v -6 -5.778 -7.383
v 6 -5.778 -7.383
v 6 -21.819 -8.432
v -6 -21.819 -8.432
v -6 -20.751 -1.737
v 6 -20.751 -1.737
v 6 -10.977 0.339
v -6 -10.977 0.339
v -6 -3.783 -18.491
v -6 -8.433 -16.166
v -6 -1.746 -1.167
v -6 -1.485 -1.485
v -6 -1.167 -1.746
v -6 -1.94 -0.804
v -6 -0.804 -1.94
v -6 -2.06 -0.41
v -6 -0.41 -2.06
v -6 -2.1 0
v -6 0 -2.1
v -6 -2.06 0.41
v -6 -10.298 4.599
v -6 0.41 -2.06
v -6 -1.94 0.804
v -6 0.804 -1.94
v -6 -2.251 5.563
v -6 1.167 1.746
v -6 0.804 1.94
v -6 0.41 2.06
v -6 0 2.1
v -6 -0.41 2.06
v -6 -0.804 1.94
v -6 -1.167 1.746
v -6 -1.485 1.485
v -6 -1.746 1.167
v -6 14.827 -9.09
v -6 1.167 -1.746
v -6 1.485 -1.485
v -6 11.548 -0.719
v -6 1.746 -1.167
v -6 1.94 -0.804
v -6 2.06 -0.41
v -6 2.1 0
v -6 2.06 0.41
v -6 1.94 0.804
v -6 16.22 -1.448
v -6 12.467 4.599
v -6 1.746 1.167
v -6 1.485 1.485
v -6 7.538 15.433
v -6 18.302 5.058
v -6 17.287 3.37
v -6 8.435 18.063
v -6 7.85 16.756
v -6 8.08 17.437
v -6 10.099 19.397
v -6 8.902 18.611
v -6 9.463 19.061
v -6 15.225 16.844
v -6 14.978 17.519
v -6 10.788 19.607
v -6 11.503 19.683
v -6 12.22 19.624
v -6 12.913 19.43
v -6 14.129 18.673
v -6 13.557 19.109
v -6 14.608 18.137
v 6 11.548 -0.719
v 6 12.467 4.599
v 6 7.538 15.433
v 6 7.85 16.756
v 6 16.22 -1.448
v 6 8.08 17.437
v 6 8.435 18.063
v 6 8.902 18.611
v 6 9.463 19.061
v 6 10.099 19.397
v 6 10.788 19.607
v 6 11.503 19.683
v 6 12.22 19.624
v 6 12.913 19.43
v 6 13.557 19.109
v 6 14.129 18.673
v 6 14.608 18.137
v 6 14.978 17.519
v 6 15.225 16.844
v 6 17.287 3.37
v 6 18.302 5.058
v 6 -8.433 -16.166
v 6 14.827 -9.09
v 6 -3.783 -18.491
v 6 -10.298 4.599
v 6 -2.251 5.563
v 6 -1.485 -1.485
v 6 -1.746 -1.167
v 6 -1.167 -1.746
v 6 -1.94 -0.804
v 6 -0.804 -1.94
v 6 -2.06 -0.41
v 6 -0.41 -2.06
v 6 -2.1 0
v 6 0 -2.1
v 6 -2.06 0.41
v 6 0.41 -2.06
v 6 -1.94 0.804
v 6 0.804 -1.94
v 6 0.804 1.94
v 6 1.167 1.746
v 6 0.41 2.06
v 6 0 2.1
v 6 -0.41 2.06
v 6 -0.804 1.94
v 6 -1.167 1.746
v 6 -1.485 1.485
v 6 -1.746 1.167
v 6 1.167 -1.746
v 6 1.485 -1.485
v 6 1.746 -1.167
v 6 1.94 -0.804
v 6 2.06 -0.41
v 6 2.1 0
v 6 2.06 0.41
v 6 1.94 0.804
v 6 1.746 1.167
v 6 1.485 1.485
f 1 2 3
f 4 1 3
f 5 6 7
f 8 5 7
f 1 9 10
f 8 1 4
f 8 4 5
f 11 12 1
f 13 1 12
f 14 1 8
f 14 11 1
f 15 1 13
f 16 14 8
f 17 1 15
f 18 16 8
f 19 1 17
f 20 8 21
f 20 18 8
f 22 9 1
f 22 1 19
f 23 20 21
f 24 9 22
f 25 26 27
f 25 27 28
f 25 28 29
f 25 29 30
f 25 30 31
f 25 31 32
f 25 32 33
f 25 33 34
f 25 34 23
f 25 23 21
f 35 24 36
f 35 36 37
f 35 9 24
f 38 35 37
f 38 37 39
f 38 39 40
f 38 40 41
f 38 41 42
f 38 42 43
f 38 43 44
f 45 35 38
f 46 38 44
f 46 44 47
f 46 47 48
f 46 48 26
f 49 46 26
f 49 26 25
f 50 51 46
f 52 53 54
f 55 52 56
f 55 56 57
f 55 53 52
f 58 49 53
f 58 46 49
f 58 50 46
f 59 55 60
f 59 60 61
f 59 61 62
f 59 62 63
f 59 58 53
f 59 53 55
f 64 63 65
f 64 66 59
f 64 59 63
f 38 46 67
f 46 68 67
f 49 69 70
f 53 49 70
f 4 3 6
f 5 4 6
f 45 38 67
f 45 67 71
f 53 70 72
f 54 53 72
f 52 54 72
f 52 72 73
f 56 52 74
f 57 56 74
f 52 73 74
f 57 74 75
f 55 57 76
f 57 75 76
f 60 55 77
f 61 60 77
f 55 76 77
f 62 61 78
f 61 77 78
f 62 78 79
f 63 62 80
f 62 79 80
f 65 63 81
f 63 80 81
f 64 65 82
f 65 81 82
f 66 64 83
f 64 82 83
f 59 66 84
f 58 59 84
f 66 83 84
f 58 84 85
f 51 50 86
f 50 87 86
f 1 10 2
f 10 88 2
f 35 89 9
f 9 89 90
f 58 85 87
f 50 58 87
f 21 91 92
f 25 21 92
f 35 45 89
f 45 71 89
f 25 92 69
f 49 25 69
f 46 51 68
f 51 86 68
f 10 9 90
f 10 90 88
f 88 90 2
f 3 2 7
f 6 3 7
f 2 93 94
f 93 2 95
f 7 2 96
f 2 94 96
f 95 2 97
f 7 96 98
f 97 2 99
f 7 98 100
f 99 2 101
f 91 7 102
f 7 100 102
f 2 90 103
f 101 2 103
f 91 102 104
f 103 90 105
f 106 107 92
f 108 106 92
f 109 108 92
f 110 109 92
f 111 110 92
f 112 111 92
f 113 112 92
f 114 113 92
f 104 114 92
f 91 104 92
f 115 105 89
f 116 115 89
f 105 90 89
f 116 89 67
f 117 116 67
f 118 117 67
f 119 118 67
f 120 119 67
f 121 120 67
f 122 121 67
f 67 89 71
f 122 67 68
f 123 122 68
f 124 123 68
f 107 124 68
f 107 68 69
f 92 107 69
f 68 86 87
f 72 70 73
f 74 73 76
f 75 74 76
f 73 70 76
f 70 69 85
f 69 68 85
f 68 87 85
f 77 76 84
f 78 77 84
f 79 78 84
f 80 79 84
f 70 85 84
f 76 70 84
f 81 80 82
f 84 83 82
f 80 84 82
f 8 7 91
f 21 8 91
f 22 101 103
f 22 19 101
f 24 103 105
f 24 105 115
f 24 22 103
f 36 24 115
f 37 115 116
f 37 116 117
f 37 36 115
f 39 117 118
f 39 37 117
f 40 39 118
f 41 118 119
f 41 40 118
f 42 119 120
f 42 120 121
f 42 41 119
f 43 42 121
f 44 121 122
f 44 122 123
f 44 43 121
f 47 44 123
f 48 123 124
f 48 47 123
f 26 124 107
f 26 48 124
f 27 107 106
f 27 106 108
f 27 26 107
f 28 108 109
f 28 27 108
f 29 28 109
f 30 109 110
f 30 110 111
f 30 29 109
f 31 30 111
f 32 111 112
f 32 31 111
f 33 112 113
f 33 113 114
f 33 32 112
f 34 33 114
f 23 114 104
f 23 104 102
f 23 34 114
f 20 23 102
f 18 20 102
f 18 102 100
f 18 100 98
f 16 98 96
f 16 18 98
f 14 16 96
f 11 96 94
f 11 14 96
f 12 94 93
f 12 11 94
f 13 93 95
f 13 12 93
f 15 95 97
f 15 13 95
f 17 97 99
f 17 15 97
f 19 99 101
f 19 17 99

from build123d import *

# Parameters (mm, degrees)
SKETCH_1_R      = 2.1
EXTRUDE_1_DEPTH = 6


with BuildPart() as part:
    # 스케치1 → 보스-돌출1 (new, symmetric)
    with BuildSketch(Plane(origin=(0, 0, 0), x_dir=(0, 0, -1), z_dir=(1, 0, 0))):
        with BuildLine():
            Line((-16.843616133, 15.225059748), (-5.058260457, 18.301873078))
            Line((-5.058260457, 18.301873078), (-3.370048504, 17.287466348))
            Line((-3.370048504, 17.287466348), (-4.598836935, 12.46676509))
            Line((-4.598836935, 12.46676509), (0.718846359, 11.548294979))
            Line((0.718846359, 11.548294979), (1.44805016, 16.220144947))
            Line((1.44805016, 16.220144947), (9.090162136, 14.827237538))
            Line((9.090162136, 14.827237538), (18.490753638, -3.782754553))
            Line((18.490753638, -3.782754553), (16.165658803, -8.432944223))
            Line((16.165658803, -8.432944223), (7.383267841, -5.77780277))
            Line((7.383267841, -5.77780277), (8.431827356, -21.818977094))
            Line((8.431827356, -21.818977094), (1.737192047, -20.750684226))
            Line((1.737192047, -20.750684226), (-0.33854919, -10.977402568))
            Line((-0.33854919, -10.977402568), (-4.598836935, -10.297569417))
            Line((-4.598836935, -10.297569417), (-5.563105297, -2.251013026))
            Line((-5.563105297, -2.251013026), (-15.432595358, 7.537806593))
            Line((-15.432595358, 7.537806593), (-16.755575012, 7.849664338))
            ThreePointArc((-16.755575012, 7.849664338), (-19.683449159, 11.502937082), (-16.843616133, 15.225059748))
        make_face()
        Circle(SKETCH_1_R, mode=Mode.SUBTRACT)
    extrude(amount=EXTRUDE_1_DEPTH, both=True)


solid = part.part
